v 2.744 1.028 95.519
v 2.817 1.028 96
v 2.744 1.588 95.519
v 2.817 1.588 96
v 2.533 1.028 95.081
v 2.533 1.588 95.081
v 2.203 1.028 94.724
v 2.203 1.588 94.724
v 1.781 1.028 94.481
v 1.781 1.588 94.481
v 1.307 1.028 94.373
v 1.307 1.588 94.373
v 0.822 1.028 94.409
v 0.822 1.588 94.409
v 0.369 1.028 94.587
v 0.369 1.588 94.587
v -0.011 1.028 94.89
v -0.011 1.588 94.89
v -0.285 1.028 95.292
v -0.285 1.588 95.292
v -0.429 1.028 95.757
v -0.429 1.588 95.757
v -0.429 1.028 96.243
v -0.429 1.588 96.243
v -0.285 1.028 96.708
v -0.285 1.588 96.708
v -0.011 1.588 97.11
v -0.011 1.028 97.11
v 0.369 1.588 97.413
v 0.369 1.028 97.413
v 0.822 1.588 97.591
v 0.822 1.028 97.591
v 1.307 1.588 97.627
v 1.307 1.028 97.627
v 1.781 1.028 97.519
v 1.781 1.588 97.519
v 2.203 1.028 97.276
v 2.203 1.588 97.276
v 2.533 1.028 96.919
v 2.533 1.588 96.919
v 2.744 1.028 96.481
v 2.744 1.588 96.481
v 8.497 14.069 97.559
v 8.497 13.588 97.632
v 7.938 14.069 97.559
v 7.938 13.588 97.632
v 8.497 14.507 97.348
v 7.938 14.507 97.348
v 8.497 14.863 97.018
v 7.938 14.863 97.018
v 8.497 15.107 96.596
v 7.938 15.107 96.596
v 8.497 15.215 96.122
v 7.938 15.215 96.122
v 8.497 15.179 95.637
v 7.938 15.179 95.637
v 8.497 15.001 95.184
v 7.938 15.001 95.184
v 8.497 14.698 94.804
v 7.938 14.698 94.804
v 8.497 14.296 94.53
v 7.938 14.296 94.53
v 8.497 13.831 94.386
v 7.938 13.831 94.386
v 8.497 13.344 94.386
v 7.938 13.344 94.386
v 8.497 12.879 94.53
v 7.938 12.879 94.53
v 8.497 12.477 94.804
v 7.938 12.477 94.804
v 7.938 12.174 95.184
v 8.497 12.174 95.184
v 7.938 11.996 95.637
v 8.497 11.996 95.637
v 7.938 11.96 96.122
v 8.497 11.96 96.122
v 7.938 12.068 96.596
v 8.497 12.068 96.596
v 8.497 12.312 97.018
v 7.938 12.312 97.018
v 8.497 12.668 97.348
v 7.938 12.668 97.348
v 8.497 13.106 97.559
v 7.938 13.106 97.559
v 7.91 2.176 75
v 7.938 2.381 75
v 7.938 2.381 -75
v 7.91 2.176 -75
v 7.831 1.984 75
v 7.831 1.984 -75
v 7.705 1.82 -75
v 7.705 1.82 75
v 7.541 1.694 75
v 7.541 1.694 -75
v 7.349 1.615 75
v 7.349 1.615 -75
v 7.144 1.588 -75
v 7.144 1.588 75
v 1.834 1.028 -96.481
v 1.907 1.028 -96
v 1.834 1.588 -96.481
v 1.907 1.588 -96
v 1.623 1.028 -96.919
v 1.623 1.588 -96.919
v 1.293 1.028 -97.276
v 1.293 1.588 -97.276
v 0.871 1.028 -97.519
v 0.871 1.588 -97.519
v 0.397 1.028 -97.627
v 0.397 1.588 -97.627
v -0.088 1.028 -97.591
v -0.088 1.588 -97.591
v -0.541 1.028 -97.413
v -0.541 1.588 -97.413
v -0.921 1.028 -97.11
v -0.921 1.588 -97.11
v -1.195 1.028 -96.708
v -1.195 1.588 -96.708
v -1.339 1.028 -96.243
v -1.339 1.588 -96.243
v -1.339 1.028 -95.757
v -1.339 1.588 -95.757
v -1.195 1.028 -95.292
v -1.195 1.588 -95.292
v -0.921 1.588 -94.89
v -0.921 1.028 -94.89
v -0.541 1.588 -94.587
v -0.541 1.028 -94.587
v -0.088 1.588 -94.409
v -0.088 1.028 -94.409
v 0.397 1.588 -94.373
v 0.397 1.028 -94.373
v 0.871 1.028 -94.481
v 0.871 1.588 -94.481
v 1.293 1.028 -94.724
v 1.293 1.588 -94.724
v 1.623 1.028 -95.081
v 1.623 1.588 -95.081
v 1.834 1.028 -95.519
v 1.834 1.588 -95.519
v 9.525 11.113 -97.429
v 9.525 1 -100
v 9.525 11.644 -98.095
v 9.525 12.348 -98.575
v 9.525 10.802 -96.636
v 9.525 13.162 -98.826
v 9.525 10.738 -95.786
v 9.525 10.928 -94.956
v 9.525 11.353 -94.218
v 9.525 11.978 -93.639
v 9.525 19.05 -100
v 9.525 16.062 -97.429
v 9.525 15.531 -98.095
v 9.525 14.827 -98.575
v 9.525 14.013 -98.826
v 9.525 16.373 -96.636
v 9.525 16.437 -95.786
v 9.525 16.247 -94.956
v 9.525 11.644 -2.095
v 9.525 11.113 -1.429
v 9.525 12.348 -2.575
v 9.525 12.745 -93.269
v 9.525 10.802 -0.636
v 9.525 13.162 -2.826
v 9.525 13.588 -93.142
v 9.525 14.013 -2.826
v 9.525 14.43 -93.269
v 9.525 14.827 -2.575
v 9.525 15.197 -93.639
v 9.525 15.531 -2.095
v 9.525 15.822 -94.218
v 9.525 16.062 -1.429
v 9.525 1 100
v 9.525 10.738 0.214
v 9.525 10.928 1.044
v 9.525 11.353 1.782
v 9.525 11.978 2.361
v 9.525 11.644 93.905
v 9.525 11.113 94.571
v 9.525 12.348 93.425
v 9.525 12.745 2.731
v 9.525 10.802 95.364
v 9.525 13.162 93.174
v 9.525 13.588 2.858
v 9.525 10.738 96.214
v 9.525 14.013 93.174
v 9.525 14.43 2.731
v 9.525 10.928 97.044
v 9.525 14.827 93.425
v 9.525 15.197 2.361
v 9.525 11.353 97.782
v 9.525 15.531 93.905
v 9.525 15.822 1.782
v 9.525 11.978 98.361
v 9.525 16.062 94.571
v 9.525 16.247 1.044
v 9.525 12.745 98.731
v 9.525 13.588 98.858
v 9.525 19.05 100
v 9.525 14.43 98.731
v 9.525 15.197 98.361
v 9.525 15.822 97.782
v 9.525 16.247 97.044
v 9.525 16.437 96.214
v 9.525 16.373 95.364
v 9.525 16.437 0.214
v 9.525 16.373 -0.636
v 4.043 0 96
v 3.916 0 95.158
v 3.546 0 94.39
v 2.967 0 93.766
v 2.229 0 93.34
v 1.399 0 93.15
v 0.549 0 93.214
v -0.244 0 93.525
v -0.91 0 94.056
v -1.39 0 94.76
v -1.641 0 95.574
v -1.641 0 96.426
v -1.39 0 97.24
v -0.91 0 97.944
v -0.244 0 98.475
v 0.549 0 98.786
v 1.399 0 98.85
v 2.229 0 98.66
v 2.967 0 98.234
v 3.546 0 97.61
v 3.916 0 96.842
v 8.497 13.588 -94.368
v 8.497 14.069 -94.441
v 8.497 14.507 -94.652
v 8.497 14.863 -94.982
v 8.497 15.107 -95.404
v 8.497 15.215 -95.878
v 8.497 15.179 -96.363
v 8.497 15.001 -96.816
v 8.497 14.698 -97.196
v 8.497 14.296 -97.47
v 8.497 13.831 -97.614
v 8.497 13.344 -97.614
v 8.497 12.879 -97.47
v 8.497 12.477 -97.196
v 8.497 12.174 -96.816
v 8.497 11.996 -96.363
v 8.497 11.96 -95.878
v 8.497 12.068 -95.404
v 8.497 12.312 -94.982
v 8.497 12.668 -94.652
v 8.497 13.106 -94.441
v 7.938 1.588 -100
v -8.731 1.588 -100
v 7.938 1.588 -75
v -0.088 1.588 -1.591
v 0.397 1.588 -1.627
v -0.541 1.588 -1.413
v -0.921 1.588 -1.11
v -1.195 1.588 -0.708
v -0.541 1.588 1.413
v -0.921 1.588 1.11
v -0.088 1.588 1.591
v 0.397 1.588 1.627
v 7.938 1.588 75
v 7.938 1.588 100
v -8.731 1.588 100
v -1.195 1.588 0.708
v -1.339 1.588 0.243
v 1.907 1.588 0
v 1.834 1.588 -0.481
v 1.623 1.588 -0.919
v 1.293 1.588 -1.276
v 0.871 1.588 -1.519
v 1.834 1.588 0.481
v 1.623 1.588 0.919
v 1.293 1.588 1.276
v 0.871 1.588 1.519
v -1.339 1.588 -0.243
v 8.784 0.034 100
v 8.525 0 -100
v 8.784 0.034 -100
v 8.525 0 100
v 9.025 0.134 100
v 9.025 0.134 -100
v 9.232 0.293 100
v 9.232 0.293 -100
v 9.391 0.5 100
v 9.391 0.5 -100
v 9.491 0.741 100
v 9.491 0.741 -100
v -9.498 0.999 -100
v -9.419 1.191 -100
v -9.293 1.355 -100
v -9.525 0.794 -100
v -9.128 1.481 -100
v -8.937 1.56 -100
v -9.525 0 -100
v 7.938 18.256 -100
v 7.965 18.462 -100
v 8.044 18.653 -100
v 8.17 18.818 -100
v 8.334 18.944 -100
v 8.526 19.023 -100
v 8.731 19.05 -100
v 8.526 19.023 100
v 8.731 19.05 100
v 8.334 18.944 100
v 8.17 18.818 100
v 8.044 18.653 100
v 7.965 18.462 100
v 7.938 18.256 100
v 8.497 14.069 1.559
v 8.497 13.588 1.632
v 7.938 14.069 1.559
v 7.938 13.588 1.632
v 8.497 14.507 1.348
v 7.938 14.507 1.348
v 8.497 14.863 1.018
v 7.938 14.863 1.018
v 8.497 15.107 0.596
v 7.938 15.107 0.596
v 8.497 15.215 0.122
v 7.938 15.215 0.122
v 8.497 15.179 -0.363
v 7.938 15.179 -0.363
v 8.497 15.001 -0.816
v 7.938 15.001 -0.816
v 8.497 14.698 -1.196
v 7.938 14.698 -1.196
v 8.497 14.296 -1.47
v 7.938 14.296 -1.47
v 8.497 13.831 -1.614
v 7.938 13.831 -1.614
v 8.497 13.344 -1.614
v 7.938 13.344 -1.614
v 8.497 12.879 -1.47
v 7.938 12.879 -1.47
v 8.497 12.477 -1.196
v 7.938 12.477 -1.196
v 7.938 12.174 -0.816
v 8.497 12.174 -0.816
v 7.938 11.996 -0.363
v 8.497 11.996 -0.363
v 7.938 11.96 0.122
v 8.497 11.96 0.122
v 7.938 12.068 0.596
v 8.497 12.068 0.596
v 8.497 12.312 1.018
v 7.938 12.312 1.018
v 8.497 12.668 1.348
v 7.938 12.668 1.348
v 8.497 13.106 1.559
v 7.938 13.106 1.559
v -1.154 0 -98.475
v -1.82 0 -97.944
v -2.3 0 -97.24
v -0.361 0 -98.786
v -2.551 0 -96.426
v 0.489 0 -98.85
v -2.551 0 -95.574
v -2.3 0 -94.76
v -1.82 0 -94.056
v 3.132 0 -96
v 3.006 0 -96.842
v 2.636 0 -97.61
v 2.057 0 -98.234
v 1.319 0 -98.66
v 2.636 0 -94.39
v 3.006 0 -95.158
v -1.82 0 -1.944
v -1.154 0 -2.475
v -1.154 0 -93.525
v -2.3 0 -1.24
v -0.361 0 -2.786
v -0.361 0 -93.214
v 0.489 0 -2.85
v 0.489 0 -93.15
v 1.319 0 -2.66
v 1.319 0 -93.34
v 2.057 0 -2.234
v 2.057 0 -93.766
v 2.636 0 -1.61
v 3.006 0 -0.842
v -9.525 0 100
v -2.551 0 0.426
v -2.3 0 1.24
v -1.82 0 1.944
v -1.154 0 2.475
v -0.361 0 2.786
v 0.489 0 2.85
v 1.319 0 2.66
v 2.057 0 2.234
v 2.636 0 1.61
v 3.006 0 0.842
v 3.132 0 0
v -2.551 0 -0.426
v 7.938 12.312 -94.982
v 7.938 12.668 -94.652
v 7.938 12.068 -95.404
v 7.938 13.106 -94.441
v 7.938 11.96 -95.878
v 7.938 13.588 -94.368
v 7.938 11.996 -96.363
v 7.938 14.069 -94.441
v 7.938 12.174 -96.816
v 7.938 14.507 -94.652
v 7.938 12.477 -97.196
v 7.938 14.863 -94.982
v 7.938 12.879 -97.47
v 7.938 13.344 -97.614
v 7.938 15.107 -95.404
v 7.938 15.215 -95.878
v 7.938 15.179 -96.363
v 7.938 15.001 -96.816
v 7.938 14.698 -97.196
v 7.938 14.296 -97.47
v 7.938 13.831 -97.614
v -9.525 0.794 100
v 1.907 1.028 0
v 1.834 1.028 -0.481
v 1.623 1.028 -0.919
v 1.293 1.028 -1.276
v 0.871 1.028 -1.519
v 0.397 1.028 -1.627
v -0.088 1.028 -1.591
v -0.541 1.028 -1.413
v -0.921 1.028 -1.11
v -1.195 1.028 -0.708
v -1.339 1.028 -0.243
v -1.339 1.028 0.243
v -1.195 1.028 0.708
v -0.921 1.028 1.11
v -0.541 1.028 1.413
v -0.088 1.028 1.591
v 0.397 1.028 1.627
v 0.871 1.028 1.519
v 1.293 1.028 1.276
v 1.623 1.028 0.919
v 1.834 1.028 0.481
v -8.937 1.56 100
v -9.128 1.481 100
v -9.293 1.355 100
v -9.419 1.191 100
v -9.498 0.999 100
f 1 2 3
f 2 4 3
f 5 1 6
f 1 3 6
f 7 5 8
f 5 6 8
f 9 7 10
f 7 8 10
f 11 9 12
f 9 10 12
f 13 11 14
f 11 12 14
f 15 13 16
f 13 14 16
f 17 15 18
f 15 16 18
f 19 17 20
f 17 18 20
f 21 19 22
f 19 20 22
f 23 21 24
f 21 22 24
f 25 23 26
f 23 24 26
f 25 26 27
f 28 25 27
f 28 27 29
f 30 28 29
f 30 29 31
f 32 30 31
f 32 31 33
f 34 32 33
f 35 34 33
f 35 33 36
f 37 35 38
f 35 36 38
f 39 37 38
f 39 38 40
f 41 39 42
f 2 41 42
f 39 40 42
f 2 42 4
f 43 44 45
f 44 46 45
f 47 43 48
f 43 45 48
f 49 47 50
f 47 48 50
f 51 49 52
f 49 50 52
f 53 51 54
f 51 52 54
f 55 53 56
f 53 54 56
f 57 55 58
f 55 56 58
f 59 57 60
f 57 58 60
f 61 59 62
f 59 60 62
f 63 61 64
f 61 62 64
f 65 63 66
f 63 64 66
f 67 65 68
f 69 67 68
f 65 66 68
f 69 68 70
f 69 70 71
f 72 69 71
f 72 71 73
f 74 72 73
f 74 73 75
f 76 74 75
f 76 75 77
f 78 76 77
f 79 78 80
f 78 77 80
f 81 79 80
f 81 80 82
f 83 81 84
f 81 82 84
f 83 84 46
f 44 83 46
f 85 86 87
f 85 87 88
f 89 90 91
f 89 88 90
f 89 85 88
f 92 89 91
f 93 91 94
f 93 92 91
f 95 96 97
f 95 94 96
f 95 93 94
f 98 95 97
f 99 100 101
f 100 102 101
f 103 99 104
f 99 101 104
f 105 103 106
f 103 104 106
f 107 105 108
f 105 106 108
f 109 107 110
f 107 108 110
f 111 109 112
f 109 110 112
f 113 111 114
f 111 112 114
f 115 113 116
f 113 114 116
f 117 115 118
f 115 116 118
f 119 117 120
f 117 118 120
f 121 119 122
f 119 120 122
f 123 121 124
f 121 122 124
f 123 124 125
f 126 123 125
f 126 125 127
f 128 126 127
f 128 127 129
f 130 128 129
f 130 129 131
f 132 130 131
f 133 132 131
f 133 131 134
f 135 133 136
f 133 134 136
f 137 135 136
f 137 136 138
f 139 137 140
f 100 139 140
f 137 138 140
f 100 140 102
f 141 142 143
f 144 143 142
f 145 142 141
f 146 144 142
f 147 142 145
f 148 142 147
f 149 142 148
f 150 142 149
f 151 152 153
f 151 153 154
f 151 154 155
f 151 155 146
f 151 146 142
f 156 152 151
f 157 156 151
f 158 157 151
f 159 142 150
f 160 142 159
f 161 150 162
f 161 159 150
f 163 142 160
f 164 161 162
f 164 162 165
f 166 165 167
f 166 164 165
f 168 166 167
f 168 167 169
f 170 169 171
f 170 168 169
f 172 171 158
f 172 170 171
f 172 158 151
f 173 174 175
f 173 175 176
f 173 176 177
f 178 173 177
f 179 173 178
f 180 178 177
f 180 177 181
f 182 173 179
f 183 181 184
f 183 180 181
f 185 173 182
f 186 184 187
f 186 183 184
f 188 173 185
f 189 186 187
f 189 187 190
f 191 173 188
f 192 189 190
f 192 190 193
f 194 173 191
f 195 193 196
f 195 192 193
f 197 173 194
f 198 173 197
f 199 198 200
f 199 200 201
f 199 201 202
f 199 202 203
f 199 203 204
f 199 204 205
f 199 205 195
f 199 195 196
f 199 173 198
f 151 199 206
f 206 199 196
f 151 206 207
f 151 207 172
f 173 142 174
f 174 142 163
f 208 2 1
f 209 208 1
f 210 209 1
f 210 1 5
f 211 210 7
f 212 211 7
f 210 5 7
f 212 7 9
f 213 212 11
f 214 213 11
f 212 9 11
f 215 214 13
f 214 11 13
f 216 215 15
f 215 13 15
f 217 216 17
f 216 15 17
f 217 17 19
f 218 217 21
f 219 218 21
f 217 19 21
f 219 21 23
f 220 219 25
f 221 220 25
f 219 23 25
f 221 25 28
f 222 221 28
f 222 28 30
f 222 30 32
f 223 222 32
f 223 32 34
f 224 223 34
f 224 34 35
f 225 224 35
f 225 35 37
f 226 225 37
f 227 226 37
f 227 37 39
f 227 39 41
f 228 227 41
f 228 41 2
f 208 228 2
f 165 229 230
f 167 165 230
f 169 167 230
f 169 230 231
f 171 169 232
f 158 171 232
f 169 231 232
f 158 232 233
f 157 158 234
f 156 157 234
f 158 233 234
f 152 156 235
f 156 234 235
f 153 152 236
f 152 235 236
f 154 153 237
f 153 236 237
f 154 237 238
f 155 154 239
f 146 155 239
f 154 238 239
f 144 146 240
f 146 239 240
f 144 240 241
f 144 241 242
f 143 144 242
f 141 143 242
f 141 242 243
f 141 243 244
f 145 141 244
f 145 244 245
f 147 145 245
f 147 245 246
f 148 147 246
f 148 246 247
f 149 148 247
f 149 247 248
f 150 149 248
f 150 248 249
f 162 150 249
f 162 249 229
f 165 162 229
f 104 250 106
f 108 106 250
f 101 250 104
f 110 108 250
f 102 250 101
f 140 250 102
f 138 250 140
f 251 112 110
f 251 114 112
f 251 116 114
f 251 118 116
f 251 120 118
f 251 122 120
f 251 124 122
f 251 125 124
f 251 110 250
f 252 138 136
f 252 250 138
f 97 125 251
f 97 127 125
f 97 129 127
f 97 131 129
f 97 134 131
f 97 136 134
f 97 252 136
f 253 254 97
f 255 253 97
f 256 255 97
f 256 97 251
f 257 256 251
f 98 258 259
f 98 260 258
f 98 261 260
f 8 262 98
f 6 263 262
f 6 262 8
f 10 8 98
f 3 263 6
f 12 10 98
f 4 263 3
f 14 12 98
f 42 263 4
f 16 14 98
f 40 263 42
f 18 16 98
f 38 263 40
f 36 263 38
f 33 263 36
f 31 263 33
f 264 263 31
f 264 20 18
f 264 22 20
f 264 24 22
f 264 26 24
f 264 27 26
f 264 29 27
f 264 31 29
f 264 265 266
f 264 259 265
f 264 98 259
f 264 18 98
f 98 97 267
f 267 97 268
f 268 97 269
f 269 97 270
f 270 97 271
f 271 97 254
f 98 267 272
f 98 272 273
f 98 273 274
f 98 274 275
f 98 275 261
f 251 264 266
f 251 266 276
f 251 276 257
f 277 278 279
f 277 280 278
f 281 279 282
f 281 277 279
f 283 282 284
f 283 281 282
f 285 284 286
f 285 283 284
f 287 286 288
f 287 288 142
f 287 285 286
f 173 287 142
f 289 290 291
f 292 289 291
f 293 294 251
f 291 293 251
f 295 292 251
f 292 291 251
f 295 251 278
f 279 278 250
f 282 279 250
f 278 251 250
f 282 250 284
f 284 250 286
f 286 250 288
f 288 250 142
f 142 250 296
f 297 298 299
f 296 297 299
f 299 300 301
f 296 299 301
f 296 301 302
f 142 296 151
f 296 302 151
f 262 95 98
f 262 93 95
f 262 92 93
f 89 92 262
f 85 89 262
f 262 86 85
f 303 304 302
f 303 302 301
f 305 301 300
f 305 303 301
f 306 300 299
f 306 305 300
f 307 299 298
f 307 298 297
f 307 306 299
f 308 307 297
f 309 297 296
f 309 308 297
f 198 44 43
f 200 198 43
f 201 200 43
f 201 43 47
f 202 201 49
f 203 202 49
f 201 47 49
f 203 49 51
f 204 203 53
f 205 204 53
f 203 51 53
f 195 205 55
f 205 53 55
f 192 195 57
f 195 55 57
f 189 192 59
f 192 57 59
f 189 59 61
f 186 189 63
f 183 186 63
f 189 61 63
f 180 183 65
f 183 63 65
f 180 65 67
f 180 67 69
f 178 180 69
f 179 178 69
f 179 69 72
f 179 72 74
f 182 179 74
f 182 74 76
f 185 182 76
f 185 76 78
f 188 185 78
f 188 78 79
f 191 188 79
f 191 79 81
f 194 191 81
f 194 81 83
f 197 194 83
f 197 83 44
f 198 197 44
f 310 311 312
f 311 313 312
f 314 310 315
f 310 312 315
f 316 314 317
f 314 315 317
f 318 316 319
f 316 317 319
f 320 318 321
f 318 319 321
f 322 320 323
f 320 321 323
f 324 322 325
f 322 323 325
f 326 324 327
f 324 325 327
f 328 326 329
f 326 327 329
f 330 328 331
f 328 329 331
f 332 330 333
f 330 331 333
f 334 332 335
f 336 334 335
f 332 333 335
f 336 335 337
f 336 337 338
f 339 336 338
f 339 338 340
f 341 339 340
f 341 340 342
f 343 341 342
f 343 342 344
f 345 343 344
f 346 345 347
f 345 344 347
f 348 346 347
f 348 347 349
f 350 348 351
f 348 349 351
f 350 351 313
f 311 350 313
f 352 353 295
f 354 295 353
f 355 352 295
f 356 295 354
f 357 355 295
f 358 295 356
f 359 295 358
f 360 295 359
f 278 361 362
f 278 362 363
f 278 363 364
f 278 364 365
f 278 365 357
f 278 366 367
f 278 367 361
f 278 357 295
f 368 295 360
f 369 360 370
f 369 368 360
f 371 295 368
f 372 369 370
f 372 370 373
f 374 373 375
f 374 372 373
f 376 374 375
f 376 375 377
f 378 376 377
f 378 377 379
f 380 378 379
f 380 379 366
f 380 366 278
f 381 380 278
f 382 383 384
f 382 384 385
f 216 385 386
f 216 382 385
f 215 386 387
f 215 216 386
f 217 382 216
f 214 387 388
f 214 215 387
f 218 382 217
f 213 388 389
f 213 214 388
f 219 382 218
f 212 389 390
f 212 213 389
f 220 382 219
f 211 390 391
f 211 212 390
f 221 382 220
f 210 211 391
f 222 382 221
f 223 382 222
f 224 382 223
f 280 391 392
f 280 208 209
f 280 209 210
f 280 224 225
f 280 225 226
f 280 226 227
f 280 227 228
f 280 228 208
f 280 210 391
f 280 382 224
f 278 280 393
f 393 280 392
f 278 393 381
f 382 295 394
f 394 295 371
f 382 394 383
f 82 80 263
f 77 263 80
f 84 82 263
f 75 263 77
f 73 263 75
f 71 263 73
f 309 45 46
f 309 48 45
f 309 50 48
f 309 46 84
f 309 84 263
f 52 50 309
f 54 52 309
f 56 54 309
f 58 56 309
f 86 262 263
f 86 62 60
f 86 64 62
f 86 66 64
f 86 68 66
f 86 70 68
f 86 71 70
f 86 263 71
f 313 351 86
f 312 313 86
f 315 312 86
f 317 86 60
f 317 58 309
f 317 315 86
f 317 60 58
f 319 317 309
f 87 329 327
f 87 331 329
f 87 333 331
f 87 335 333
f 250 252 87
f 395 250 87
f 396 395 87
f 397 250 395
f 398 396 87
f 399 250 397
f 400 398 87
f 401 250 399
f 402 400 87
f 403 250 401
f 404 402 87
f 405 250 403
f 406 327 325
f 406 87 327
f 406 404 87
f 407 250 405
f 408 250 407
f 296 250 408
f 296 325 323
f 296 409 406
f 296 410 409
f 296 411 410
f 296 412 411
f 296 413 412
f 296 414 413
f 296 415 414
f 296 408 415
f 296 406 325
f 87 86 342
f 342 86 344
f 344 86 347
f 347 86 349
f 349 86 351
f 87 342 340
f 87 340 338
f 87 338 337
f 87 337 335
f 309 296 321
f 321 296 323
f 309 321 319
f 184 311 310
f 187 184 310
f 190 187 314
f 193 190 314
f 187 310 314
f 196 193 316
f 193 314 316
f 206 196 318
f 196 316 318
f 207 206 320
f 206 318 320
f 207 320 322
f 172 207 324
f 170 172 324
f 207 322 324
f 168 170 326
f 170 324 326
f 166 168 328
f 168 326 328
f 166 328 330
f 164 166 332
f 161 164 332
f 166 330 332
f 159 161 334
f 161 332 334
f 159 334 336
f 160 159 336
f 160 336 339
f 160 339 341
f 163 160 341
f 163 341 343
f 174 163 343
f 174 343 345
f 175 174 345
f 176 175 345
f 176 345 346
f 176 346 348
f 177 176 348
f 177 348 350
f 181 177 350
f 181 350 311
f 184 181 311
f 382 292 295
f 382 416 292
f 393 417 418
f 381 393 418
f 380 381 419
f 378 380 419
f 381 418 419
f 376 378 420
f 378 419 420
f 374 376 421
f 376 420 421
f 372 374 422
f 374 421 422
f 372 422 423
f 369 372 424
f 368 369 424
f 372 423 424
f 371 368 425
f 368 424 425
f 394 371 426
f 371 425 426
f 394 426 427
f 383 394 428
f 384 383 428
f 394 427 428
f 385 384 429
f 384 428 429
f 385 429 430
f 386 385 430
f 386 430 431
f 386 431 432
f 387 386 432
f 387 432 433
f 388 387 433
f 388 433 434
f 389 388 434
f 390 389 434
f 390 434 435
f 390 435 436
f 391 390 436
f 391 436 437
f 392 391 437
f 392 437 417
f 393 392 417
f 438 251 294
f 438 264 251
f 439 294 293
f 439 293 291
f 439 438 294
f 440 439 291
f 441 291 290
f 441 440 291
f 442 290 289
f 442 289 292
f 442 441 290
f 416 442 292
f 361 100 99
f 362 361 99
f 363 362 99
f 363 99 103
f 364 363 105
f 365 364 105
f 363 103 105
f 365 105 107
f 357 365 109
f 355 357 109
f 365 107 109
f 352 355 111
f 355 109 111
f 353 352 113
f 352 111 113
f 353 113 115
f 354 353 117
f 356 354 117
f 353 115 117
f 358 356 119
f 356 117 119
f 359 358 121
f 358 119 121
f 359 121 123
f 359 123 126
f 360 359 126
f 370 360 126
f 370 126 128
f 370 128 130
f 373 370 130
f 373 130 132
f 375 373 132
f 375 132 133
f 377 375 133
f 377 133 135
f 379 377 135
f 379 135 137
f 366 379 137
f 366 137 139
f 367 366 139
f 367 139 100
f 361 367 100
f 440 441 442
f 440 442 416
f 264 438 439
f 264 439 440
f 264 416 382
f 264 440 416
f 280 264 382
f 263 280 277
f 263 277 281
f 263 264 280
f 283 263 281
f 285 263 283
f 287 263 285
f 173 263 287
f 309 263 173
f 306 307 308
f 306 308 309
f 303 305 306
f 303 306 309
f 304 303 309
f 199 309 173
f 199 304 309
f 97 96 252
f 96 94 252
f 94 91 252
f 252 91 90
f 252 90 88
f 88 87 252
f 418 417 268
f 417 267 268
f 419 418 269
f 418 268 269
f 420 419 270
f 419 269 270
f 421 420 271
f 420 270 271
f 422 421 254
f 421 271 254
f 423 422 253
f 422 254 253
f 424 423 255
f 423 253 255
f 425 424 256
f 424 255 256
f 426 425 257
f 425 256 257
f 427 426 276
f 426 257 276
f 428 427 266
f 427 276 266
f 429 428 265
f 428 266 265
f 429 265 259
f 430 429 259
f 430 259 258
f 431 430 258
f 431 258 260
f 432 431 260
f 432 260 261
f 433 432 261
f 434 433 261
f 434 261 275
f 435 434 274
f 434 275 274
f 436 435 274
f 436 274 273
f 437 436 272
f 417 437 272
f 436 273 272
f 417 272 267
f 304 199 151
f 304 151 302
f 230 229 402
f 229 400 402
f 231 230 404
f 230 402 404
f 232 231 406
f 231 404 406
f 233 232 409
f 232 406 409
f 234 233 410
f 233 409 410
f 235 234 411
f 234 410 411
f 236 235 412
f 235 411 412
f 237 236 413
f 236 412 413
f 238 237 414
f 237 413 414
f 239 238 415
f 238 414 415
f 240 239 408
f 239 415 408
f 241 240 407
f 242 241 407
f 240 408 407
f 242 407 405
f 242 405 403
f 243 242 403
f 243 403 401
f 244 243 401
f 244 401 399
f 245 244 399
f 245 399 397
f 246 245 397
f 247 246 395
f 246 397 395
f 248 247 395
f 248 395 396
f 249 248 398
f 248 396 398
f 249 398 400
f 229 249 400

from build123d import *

# Parameters (mm, degrees)
BOSS_EXTRUDE1_DEPTH                               = 100
CSK_FOR_4_FLAT_HEAD_MACHINE_SCREW_100_D           = 3.2639
CSK_FOR_4_FLAT_HEAD_MACHINE_SCREW_100_CSINK_D     = 5.715
CSK_FOR_4_FLAT_HEAD_MACHINE_SCREW_100_CSINK_ANGLE = 100
CSK_FOR_4_FLAT_HEAD_MACHINE_SCREW_2_D             = 3.2639
CSK_FOR_4_FLAT_HEAD_MACHINE_SCREW_2_CSINK_D       = 5.715
CSK_FOR_4_FLAT_HEAD_MACHINE_SCREW_2_CSINK_ANGLE   = 100
FILLET1_R                                         = 1
CSK_FOR_4_FLAT_HEAD_MACHINE_SCREW_3_D             = 3.2639
CSK_FOR_4_FLAT_HEAD_MACHINE_SCREW_3_CSINK_D       = 5.715
CSK_FOR_4_FLAT_HEAD_MACHINE_SCREW_3_CSINK_ANGLE   = 100
CSK_FOR_4_FLAT_HEAD_MACHINE_SCREW_4_D             = 3.2639
CSK_FOR_4_FLAT_HEAD_MACHINE_SCREW_4_CSINK_D       = 5.715
CSK_FOR_4_FLAT_HEAD_MACHINE_SCREW_4_CSINK_ANGLE   = 100
CUT_EXTRUDE1_DEPTH                                = 25


with BuildPart() as part:
    # Sketch2 → Boss-Extrude1 (new, symmetric)
    with BuildSketch(Plane.XY):
        with BuildLine():
            Line((-9.525, 0), (9.525, 0))
            Line((9.525, 0), (9.525, 19.05))
            Line((9.525, 19.05), (8.73125, 19.05))
            ThreePointArc((8.73125, 19.05), (8.169983992, 18.817516008), (7.9375, 18.25625))
            Line((7.9375, 18.25625), (7.9375, 2.38125))
            ThreePointArc((7.9375, 2.38125), (7.705016008, 1.819983992), (7.14375, 1.5875))
            Line((7.14375, 1.5875), (-8.73125, 1.5875))
            ThreePointArc((-8.73125, 1.5875), (-9.292516008, 1.355016008), (-9.525, 0.79375))
            Line((-9.525, 0.79375), (-9.525, 0))
        make_face()
    extrude(amount=BOSS_EXTRUDE1_DEPTH, both=True)

    # CSK for _4 Flat Head Machine Screw _100 (through all)
    with Locations(Plane(origin=(0, 0, 0), x_dir=(-1, 0, 0), z_dir=(0, -1, 0))):
        with Locations((-1.185, -96), (-0.275, 96)):
            CounterSinkHole(CSK_FOR_4_FLAT_HEAD_MACHINE_SCREW_100_D / 2, CSK_FOR_4_FLAT_HEAD_MACHINE_SCREW_100_CSINK_D / 2, counter_sink_angle=CSK_FOR_4_FLAT_HEAD_MACHINE_SCREW_100_CSINK_ANGLE)

    # CSK for _4 Flat Head Machine Screw _ 2 (through all)
    with Locations(Plane(origin=(9.525, 0, 0), x_dir=(0, 0, -1), z_dir=(1, 0, 0))):
        with Locations((-96, 13.5875), (96, 13.5875)):
            CounterSinkHole(CSK_FOR_4_FLAT_HEAD_MACHINE_SCREW_2_D / 2, CSK_FOR_4_FLAT_HEAD_MACHINE_SCREW_2_CSINK_D / 2, counter_sink_angle=CSK_FOR_4_FLAT_HEAD_MACHINE_SCREW_2_CSINK_ANGLE)

    # Fillet1
    fillet1_edges = [part.edges().sort_by_distance(p)[0] for p in [
        (9.525, 0, 0),
    ]]
    fillet(fillet1_edges, radius=FILLET1_R)

    # CSK for _4 Flat Head Machine Screw _ 3 (through all)
    with Locations(Plane(origin=(0, 0, 0), x_dir=(-1, 0, 0), z_dir=(0, -1, 0))):
        with Locations((-0.275, 0)):
            CounterSinkHole(CSK_FOR_4_FLAT_HEAD_MACHINE_SCREW_3_D / 2, CSK_FOR_4_FLAT_HEAD_MACHINE_SCREW_3_CSINK_D / 2, counter_sink_angle=CSK_FOR_4_FLAT_HEAD_MACHINE_SCREW_3_CSINK_ANGLE)

    # CSK for _4 Flat Head Machine Screw _ 4 (through all)
    with Locations(Plane(origin=(9.525, 0, 0), x_dir=(0, 0, -1), z_dir=(1, 0, 0))):
        with Locations((0, 13.5875)):
            CounterSinkHole(CSK_FOR_4_FLAT_HEAD_MACHINE_SCREW_4_D / 2, CSK_FOR_4_FLAT_HEAD_MACHINE_SCREW_4_CSINK_D / 2, counter_sink_angle=CSK_FOR_4_FLAT_HEAD_MACHINE_SCREW_4_CSINK_ANGLE)

    # Sketch26 → Cut-Extrude1 (cut)
    with BuildSketch(Plane.XY.offset(100)):
        Polygon((2.9375, 1.5875), (7.9375, 1.5875), (7.9375, 6.5875), align=None)
    cut_extrude1 = extrude(amount=-CUT_EXTRUDE1_DEPTH, mode=Mode.SUBTRACT)

    # Mirror1: Cut-Extrude1 across plane
    add(cut_extrude1.mirror(Plane.XY), mode=Mode.SUBTRACT)


solid = part.part
